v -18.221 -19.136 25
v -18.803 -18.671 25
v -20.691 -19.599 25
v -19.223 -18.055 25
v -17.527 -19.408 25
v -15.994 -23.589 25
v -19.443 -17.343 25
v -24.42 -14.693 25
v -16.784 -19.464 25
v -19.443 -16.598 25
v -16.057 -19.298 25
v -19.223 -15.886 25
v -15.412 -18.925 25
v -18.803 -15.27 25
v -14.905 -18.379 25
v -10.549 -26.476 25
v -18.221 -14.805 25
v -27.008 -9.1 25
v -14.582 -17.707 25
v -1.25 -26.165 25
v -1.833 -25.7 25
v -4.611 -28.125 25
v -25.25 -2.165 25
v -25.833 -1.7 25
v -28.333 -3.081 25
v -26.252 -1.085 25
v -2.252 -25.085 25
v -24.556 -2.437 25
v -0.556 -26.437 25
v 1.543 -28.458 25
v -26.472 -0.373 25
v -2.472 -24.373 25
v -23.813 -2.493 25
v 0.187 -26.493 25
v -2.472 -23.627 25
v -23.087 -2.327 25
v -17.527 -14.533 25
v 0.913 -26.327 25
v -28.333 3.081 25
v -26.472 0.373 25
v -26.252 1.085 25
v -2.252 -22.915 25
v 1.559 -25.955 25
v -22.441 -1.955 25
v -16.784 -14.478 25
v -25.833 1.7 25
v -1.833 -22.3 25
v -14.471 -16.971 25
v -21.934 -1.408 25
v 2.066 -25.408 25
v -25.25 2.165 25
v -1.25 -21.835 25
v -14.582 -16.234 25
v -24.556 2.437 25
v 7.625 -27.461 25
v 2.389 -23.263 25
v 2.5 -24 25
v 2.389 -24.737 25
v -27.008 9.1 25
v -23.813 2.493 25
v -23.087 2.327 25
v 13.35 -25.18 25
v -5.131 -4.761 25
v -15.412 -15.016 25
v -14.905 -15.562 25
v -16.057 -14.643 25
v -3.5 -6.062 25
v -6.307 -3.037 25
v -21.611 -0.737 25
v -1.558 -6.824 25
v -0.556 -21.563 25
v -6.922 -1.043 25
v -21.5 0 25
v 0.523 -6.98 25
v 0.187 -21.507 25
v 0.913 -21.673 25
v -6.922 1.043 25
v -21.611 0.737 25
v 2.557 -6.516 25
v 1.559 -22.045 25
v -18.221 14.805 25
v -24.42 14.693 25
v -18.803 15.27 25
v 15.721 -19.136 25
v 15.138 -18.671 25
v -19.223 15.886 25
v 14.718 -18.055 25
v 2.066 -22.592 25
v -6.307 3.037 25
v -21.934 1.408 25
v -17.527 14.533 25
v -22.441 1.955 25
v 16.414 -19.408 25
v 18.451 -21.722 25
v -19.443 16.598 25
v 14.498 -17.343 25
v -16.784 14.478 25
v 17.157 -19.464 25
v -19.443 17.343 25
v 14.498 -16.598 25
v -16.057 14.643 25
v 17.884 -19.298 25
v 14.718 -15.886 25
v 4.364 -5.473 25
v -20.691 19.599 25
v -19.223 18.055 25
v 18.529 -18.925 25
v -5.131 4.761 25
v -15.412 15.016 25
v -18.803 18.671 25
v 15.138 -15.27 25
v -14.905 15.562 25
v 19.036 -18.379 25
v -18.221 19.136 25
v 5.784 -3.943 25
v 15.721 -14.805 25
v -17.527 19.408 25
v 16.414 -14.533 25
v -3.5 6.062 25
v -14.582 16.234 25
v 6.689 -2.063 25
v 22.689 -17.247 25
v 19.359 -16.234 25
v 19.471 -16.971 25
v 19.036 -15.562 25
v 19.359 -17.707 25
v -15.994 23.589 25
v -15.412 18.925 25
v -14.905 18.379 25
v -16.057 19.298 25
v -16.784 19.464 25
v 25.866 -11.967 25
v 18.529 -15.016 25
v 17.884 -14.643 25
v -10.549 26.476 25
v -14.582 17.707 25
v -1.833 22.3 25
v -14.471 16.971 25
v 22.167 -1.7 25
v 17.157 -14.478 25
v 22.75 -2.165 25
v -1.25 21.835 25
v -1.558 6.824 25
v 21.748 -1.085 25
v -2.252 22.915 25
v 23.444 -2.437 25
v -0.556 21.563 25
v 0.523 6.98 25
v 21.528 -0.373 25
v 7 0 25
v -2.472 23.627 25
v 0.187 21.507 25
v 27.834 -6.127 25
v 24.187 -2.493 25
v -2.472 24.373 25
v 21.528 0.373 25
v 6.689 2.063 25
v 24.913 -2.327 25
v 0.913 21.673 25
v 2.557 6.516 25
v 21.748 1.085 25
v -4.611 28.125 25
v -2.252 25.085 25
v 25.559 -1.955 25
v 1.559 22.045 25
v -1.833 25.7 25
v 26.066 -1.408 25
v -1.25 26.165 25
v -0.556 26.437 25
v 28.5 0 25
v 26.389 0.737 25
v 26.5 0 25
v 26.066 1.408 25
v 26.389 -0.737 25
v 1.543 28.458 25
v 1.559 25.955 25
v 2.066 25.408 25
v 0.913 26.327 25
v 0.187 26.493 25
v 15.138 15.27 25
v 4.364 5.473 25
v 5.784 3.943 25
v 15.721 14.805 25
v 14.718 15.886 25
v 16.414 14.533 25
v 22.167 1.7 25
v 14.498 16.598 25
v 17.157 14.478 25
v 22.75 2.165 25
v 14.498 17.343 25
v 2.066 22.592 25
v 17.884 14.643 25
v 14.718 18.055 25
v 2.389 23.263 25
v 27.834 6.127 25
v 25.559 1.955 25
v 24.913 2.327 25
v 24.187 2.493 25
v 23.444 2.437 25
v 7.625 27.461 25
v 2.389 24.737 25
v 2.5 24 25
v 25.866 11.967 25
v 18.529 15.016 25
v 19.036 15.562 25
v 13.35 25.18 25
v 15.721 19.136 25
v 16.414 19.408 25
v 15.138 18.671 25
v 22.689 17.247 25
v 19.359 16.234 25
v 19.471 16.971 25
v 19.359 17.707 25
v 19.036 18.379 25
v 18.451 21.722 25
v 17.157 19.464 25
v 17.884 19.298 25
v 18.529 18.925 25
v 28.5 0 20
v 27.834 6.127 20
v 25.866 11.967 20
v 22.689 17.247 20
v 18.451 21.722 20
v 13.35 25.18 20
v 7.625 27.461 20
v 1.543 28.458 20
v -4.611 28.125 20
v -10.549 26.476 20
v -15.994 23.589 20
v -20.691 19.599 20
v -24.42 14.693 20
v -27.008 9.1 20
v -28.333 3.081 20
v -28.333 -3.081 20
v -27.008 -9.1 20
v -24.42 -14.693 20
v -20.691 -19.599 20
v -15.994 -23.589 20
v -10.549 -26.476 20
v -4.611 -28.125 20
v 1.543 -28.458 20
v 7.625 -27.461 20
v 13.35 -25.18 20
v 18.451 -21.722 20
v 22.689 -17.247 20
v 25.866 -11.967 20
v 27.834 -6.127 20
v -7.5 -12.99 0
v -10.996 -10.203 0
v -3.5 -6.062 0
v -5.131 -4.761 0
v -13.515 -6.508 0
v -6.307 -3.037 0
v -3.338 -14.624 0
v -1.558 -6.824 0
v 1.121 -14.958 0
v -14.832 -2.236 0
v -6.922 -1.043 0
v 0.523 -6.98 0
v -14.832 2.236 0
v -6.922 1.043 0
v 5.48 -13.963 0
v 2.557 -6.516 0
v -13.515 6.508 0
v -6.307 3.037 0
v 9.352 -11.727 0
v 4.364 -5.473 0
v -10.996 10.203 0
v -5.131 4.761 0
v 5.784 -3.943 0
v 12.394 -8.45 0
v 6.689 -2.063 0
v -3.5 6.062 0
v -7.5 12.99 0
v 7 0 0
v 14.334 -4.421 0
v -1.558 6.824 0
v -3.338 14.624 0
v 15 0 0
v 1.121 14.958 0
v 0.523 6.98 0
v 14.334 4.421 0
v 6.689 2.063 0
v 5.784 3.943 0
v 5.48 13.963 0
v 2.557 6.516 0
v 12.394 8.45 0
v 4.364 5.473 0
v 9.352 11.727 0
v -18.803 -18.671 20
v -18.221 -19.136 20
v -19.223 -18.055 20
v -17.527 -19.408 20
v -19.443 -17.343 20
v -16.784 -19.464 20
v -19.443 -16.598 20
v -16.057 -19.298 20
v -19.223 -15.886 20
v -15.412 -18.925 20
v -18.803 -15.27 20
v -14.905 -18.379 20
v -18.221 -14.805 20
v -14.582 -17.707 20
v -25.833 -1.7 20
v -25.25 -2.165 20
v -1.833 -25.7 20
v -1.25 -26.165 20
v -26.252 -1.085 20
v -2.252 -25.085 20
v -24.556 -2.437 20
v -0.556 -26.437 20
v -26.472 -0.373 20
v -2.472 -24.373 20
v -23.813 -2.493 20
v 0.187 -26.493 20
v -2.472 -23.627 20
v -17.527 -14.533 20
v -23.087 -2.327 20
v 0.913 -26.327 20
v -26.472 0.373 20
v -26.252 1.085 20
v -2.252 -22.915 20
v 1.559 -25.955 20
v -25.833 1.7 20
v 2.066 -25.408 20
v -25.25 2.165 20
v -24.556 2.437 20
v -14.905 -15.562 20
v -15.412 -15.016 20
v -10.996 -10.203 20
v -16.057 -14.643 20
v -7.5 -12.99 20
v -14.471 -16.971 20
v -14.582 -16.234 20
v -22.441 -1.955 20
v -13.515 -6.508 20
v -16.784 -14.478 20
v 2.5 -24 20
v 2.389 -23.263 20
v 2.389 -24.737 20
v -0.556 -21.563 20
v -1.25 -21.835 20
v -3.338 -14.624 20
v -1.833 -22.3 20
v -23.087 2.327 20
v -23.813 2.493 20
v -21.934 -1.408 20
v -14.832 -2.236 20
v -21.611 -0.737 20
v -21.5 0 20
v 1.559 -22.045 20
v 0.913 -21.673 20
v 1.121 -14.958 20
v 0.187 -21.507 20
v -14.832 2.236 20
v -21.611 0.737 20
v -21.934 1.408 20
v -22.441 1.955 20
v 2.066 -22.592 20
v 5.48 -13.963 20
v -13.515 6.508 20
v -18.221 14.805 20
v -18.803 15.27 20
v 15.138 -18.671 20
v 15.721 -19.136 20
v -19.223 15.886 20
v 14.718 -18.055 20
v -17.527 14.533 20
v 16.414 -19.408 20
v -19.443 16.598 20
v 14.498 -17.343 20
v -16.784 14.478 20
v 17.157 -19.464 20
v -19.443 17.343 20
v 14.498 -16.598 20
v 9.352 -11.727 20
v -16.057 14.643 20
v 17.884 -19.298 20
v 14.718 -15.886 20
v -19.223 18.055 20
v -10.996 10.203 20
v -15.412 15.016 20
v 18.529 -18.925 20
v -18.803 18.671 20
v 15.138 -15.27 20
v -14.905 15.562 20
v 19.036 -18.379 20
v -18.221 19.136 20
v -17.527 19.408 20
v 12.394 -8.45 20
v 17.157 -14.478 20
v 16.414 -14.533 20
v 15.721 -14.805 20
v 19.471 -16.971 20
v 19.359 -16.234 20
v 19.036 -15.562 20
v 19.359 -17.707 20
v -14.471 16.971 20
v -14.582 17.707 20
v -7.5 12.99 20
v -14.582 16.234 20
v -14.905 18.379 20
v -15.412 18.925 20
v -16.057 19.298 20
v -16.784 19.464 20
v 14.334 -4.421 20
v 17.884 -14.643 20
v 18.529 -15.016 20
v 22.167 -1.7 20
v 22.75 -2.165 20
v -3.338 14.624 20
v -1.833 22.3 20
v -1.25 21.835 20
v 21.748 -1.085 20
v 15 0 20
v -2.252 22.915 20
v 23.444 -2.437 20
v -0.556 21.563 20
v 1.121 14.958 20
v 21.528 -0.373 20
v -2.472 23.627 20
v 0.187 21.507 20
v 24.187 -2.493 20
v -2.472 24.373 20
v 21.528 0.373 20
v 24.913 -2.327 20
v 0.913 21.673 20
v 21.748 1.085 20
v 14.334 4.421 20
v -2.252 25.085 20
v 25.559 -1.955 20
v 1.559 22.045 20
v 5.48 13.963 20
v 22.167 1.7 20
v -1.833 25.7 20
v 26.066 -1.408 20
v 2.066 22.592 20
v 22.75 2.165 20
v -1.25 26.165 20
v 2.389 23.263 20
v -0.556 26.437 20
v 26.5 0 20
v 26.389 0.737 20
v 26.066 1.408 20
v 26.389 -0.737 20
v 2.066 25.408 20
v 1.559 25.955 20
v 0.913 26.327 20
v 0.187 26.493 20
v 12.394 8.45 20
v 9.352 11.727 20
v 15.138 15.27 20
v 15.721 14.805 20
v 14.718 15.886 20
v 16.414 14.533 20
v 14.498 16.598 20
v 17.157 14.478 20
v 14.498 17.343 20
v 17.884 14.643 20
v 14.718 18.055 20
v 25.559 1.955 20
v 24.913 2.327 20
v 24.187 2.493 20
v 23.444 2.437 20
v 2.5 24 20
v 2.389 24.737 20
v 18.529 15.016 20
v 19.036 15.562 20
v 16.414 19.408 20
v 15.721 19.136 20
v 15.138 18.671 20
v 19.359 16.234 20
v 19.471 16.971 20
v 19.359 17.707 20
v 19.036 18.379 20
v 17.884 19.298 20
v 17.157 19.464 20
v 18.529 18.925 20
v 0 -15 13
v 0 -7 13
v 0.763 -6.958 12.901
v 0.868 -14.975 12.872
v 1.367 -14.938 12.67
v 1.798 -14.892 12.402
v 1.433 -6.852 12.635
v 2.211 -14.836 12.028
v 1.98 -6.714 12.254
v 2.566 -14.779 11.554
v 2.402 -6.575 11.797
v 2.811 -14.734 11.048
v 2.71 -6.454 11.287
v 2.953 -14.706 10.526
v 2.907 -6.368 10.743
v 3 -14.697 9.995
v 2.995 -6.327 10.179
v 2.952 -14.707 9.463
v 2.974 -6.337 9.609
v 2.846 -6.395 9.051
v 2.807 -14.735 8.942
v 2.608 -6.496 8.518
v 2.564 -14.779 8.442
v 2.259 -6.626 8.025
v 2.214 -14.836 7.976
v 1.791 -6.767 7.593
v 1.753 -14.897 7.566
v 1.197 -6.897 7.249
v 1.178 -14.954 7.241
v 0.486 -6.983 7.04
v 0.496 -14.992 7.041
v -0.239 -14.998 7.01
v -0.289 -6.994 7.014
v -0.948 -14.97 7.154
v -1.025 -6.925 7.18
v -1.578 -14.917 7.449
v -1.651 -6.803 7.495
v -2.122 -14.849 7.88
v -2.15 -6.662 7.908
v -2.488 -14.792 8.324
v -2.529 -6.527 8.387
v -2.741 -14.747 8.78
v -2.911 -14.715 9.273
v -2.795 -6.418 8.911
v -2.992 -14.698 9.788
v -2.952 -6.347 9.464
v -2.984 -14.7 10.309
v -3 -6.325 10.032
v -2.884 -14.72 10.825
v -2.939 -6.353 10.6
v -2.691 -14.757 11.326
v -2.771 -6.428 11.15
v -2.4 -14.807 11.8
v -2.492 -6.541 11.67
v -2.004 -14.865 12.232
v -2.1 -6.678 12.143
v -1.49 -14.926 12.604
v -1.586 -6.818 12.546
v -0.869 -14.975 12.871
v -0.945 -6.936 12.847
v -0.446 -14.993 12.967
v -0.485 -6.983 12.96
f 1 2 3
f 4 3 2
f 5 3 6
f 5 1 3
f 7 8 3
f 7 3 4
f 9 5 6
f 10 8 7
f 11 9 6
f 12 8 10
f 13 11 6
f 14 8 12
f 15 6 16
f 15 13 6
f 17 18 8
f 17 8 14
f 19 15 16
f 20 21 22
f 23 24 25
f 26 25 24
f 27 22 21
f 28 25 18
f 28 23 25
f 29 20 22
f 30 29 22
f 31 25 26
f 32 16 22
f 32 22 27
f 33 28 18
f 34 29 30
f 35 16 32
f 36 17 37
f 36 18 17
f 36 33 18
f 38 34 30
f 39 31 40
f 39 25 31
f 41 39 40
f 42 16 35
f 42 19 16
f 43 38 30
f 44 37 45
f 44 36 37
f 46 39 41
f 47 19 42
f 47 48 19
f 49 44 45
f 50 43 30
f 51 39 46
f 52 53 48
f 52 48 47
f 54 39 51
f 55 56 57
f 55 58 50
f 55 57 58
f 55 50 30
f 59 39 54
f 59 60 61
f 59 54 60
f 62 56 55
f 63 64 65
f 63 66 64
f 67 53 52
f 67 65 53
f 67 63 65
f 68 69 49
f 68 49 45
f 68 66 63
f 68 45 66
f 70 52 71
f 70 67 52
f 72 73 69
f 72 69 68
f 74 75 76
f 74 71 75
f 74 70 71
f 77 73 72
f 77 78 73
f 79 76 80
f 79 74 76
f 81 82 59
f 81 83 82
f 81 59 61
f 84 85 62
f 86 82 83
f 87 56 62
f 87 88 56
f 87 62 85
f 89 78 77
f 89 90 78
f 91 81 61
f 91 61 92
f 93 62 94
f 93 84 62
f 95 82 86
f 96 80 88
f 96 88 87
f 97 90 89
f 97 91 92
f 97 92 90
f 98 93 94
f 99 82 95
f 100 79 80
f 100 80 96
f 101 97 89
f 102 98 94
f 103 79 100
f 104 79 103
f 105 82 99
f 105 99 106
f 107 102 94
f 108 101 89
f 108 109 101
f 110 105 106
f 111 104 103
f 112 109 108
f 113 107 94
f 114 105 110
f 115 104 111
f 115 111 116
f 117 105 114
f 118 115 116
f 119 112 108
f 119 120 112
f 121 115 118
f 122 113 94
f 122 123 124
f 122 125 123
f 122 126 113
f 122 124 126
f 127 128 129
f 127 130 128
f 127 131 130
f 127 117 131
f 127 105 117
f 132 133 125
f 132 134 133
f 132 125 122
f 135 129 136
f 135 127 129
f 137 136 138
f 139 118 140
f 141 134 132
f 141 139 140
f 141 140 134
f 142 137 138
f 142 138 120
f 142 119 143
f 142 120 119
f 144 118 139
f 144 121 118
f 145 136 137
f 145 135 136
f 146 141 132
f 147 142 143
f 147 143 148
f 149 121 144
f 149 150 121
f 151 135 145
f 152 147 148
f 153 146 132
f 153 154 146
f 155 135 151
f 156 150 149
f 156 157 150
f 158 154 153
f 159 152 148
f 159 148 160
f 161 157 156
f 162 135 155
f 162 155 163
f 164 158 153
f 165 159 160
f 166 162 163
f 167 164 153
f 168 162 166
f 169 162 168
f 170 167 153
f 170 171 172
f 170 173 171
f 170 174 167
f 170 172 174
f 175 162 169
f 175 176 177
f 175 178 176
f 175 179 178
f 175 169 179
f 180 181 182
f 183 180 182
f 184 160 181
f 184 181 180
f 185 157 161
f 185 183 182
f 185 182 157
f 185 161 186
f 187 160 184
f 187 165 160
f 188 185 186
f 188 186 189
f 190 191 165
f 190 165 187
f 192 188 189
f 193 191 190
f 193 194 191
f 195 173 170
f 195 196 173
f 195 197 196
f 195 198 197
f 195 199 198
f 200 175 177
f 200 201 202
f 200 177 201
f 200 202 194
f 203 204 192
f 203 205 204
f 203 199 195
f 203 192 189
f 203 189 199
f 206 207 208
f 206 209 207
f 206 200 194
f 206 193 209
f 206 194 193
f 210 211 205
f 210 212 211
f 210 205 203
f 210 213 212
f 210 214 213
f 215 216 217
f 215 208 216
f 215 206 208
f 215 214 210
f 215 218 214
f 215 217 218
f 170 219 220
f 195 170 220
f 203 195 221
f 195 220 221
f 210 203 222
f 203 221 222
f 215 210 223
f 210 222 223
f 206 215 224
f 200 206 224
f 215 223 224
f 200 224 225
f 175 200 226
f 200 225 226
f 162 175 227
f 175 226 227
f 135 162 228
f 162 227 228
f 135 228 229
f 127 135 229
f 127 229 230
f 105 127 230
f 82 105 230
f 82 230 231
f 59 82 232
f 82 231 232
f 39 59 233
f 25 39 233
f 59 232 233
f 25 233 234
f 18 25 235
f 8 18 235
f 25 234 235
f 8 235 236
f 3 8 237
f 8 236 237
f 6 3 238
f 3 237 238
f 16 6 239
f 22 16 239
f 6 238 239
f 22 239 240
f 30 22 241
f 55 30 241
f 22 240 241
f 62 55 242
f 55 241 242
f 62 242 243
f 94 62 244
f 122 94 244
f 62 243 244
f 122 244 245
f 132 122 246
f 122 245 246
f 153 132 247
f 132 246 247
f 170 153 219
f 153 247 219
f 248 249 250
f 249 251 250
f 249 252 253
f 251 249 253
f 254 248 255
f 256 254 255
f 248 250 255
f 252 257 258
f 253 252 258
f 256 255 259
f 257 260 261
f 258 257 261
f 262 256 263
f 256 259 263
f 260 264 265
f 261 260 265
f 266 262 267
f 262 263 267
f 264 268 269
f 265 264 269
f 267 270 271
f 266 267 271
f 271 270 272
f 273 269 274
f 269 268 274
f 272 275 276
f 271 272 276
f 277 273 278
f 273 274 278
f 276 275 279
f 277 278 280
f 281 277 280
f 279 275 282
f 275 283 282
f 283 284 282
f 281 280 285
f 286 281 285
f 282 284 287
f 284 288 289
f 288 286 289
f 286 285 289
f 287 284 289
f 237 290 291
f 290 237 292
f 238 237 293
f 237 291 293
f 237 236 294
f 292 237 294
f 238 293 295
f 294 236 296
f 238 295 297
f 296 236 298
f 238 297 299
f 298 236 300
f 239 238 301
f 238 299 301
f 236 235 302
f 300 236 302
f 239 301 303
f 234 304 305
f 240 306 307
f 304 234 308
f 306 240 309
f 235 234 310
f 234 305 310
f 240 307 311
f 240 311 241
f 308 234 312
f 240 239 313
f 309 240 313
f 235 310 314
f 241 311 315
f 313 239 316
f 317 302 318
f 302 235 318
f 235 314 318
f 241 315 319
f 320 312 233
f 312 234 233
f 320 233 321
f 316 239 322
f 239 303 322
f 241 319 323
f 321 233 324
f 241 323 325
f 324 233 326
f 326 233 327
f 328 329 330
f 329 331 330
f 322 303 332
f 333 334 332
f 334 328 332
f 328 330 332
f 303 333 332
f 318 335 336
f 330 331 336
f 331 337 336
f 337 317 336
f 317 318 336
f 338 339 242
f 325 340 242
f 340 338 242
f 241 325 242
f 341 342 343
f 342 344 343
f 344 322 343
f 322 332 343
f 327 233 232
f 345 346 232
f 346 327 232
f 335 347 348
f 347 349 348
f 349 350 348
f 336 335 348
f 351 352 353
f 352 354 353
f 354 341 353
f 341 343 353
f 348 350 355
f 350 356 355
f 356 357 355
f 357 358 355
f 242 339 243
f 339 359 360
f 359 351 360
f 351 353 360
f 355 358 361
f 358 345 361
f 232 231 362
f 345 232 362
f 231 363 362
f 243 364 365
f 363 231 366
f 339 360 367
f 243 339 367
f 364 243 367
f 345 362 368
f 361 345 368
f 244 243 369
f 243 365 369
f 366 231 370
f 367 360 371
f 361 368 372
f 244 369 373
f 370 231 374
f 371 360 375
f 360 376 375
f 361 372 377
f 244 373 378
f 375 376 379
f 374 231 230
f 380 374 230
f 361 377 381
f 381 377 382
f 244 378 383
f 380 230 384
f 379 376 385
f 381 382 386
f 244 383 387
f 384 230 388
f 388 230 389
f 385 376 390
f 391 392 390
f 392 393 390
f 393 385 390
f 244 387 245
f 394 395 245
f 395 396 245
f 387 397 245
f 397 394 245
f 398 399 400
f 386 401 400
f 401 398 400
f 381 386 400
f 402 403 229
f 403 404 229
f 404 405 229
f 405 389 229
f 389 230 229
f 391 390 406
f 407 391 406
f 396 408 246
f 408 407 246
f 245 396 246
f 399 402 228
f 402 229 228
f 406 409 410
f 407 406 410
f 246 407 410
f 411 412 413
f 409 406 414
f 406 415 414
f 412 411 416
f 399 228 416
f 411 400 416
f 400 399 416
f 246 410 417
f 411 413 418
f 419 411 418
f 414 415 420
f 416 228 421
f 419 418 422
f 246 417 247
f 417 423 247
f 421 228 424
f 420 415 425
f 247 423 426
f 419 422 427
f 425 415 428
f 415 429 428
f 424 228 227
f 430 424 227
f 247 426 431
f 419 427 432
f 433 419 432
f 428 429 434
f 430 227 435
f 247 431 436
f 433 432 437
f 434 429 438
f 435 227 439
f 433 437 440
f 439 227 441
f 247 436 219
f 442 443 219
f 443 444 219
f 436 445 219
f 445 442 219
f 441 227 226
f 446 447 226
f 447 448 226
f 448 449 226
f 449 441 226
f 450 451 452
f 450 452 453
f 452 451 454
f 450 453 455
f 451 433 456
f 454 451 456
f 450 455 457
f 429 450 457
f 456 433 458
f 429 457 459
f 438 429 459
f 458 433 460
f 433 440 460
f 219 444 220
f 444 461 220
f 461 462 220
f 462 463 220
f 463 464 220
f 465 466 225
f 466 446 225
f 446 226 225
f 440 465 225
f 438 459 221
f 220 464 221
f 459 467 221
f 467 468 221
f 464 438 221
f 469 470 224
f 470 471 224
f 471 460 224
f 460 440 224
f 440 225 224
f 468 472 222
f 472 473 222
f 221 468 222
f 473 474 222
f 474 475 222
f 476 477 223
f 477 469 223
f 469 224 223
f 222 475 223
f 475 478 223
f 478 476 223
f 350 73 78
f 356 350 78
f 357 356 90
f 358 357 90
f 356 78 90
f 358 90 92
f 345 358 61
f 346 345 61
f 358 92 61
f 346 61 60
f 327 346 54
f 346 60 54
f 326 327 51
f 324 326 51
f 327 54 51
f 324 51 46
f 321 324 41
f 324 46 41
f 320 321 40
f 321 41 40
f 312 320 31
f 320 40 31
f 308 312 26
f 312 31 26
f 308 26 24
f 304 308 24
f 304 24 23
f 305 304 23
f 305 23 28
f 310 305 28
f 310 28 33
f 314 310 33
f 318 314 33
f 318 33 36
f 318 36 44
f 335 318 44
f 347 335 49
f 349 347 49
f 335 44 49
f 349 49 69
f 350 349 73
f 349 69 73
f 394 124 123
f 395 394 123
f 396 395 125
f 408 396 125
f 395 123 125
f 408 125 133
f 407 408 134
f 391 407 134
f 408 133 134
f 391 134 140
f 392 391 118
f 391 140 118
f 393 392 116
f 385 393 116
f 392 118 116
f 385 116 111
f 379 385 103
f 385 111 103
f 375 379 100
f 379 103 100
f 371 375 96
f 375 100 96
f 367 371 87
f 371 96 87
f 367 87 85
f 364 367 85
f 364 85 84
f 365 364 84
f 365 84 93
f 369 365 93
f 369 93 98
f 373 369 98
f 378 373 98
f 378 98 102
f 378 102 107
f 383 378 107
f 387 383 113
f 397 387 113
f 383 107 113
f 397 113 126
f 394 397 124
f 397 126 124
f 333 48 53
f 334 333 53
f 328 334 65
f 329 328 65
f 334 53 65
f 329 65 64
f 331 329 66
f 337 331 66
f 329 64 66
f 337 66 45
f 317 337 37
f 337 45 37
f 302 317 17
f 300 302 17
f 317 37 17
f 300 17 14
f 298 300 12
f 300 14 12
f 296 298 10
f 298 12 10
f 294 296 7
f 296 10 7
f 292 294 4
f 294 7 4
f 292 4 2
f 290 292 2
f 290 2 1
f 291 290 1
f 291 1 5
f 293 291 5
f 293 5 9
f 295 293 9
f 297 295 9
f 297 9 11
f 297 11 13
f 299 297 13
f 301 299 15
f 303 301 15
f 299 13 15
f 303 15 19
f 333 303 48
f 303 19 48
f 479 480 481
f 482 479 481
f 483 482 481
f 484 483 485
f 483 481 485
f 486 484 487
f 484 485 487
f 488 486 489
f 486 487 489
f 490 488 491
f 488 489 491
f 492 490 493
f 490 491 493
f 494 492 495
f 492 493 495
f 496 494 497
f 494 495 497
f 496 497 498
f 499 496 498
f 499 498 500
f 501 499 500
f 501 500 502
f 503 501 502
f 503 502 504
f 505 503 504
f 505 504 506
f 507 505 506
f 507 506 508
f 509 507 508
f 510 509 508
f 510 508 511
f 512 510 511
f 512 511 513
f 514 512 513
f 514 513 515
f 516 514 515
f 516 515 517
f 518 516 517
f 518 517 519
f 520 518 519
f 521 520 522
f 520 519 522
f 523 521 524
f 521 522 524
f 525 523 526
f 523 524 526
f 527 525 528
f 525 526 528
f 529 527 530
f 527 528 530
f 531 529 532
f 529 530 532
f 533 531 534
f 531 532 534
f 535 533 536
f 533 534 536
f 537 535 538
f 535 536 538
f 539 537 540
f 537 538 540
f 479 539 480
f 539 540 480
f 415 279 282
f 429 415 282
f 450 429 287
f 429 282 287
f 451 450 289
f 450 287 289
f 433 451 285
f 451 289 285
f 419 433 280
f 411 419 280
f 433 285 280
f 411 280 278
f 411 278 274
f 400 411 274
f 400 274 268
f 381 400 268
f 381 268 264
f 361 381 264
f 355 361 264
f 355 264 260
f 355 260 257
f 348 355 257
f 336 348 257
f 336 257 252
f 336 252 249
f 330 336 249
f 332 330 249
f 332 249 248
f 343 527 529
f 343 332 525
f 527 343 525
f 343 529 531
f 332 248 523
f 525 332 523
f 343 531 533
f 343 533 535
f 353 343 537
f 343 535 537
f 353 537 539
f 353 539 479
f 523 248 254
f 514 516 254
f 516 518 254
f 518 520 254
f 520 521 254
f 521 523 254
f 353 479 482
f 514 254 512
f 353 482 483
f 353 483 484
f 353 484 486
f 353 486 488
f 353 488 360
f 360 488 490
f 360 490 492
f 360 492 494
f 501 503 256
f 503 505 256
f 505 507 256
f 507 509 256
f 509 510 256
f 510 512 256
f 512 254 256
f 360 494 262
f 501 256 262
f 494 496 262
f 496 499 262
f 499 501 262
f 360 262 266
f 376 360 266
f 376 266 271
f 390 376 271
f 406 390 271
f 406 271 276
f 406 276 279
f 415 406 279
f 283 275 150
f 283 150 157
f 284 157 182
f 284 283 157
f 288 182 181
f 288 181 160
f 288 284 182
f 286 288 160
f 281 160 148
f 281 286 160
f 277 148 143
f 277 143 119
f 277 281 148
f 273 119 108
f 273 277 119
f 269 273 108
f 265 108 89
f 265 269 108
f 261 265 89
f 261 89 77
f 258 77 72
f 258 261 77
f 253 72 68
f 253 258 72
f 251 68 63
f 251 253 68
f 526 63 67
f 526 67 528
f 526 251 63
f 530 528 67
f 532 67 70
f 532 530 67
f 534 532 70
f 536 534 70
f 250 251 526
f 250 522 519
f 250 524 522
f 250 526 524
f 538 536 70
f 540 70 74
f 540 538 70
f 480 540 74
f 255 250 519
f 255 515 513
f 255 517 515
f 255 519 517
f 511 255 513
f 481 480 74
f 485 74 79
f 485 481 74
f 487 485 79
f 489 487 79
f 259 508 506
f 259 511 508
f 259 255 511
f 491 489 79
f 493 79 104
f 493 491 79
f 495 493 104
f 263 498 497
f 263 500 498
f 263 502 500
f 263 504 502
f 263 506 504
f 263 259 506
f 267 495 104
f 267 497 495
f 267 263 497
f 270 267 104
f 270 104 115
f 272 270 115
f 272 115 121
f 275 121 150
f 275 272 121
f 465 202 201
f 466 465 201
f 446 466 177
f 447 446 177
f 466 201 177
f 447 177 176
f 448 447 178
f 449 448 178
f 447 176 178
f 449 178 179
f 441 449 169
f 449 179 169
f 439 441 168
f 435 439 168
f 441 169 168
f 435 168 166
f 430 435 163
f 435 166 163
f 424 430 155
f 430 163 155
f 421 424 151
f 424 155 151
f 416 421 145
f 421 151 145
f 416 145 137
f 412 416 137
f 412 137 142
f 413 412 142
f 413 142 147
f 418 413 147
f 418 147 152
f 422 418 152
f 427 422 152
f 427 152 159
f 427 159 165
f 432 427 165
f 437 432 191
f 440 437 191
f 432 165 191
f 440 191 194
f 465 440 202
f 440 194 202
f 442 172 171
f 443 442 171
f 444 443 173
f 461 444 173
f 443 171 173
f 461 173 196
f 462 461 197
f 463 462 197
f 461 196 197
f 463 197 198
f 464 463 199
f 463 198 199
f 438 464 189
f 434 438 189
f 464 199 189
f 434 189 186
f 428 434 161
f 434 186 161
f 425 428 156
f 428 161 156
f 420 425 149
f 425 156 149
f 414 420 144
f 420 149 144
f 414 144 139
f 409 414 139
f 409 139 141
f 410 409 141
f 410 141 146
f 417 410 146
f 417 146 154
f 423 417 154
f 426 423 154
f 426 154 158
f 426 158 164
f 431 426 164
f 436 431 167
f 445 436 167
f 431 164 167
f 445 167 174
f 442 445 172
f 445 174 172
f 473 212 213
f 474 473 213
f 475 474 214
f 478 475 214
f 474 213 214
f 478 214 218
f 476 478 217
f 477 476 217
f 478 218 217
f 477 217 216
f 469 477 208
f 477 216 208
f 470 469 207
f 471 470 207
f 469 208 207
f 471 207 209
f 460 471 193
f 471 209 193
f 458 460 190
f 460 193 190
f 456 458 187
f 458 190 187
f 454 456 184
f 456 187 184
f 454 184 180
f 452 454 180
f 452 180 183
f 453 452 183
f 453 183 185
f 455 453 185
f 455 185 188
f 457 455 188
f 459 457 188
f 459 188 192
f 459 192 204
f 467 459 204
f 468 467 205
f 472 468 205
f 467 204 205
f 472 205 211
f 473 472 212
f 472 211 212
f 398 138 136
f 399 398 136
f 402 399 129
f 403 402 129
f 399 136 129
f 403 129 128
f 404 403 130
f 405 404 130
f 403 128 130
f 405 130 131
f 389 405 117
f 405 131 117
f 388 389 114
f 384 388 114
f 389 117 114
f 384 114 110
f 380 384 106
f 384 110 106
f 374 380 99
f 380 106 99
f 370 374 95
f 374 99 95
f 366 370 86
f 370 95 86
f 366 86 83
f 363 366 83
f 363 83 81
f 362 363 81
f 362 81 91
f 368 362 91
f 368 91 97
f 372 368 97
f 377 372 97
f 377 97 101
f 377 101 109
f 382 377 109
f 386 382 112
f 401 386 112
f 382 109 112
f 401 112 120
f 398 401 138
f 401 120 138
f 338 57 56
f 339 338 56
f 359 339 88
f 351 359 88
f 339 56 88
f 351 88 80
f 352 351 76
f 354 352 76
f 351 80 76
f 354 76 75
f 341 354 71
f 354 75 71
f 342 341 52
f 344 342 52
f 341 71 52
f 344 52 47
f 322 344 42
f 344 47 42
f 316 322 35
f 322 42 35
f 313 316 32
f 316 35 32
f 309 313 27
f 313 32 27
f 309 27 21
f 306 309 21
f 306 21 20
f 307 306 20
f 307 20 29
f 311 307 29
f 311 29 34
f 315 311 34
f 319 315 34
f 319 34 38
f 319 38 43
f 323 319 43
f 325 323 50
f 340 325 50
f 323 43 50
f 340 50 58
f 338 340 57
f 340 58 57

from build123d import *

# Parameters (mm, degrees)
SKETCH_1_R          = 15
SKETCH_1_R_2        = 7
EXTRUDE_1_DEPTH     = 20
SKETCH_2_R          = 28.5
SKETCH_2_R_2        = 7
EXTRUDE_2_DEPTH     = 5
SKETCH_3_R          = 2.5
CUT_EXTRUDE_1_DEPTH = 5
SKETCH_4_R          = 3
CUT_EXTRUDE_2_DEPTH = 20


with BuildPart() as part:
    # 草图1 → 凸台-拉伸1 (new body)
    with BuildSketch(Plane.XY):
        Circle(SKETCH_1_R)
        Circle(SKETCH_1_R_2, mode=Mode.SUBTRACT)
    extrude(amount=EXTRUDE_1_DEPTH)

    # 草图2 → 凸台-拉伸2 (add)
    with BuildSketch(Plane.XY.offset(20)):
        Circle(SKETCH_2_R)
        Circle(SKETCH_2_R_2, mode=Mode.SUBTRACT)
    extrude(amount=EXTRUDE_2_DEPTH)

    # 草图3 → 切除-拉伸1 (cut)
    with BuildSketch(Plane.XY.offset(25)):
        with Locations((0, -24)):
            Circle(SKETCH_3_R)
        with Locations((-16.970562748, -16.970562748)):
            Circle(SKETCH_3_R)
        with Locations((-24, 0)):
            Circle(SKETCH_3_R)
        with Locations((-16.970562748, 16.970562748)):
            Circle(SKETCH_3_R)
        with Locations((0, 24)):
            Circle(SKETCH_3_R)
        with Locations((16.970562748, 16.970562748)):
            Circle(SKETCH_3_R)
        with Locations((24, 0)):
            Circle(SKETCH_3_R)
        with Locations((16.970562748, -16.970562748)):
            Circle(SKETCH_3_R)
    extrude(amount=-CUT_EXTRUDE_1_DEPTH, mode=Mode.SUBTRACT)

    # 草图4 → 切除-拉伸2 (cut)
    with BuildSketch(Plane(origin=(0, 0, 0), x_dir=(1, 0, 0), z_dir=(0, 1, 0))):
        with Locations(Location((0, -10, 0), (0, 0, 270))):
            Circle(SKETCH_4_R)
    extrude(amount=-CUT_EXTRUDE_2_DEPTH, mode=Mode.SUBTRACT)


solid = part.part
